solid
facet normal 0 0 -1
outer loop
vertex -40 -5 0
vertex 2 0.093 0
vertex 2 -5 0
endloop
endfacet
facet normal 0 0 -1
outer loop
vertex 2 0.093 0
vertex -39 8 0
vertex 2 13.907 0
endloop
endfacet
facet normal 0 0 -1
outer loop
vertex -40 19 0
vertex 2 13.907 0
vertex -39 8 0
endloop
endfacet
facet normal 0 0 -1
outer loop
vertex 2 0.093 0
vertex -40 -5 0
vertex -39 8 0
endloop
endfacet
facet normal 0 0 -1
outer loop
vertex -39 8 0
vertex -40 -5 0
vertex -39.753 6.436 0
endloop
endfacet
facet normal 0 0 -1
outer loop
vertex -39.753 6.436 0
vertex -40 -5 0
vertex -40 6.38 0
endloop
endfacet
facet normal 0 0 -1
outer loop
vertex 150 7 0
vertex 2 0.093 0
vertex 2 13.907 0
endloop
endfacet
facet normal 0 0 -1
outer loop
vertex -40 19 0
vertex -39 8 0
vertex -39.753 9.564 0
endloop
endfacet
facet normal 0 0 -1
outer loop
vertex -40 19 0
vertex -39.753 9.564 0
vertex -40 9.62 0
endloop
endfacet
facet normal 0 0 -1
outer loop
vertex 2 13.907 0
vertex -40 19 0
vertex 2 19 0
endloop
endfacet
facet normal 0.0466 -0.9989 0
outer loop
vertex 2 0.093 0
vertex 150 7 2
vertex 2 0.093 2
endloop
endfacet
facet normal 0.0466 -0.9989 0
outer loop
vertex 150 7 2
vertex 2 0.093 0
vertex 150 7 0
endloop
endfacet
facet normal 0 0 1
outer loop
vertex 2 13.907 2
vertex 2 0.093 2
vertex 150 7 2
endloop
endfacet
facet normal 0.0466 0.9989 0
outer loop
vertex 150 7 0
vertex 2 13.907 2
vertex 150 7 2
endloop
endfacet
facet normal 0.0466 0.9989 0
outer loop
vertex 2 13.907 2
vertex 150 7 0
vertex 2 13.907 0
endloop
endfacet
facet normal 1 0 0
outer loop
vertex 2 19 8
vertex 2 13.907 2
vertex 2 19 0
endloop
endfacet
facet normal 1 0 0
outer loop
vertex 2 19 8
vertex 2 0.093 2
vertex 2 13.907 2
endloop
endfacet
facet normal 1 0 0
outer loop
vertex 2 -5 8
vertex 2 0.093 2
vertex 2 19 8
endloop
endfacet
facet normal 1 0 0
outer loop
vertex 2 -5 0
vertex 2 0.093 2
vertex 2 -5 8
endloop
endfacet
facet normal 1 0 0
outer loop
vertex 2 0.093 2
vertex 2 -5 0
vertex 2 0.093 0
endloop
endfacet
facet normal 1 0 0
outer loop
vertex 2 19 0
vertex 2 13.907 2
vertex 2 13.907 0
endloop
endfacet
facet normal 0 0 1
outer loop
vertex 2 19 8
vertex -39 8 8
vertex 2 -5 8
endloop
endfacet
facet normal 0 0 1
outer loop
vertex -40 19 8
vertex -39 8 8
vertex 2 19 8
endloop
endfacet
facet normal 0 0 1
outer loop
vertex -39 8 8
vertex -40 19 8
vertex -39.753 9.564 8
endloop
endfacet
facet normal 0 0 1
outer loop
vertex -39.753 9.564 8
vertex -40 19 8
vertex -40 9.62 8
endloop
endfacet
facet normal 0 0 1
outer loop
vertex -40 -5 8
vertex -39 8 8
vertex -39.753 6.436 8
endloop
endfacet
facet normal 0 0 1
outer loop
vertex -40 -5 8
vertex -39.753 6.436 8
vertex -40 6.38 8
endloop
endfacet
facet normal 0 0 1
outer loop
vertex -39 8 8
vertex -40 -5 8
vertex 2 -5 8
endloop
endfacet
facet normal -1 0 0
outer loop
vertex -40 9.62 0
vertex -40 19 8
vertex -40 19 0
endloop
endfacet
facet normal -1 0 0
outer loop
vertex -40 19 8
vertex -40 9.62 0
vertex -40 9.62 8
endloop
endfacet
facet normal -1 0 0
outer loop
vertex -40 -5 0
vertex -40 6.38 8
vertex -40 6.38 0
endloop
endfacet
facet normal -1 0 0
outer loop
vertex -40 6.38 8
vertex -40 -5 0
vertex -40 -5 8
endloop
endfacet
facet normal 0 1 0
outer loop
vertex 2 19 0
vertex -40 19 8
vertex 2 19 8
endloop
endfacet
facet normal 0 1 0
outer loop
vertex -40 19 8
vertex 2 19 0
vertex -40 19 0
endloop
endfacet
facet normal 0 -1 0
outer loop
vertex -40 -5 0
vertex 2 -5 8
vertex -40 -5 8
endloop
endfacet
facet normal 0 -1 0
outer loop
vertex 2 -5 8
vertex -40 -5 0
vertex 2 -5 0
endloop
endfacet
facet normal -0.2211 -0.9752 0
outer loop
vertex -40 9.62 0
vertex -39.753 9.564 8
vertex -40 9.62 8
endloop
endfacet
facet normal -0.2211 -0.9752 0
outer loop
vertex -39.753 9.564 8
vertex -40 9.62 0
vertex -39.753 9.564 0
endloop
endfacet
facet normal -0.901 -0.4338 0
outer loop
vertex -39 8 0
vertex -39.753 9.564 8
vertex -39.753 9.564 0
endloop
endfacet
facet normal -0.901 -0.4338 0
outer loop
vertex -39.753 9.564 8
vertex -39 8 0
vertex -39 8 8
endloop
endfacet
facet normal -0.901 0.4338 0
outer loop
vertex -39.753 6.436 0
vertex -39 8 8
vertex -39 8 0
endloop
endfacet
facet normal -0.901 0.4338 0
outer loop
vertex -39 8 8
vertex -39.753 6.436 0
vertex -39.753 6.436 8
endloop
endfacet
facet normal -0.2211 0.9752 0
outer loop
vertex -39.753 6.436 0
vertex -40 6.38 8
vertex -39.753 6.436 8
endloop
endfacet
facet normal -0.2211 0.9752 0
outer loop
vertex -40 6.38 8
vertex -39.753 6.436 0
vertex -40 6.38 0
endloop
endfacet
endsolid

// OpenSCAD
// Brevkniven - blad og håndtak. Mål i mm.
blad_lengde = 150;
blad_bredde = 14;
tykkelse = 2;

difference() {
    union() {
        linear_extrude(height = tykkelse)
            polygon([[0, 0], [blad_lengde, blad_bredde / 2], [0, blad_bredde]]);
        translate([-40, -5, 0]) cube([42, 24, 8]);  // håndtak
    }
    translate([-41, 8, -1]) cylinder(h = 10, r = 2);  // hengehull
}
